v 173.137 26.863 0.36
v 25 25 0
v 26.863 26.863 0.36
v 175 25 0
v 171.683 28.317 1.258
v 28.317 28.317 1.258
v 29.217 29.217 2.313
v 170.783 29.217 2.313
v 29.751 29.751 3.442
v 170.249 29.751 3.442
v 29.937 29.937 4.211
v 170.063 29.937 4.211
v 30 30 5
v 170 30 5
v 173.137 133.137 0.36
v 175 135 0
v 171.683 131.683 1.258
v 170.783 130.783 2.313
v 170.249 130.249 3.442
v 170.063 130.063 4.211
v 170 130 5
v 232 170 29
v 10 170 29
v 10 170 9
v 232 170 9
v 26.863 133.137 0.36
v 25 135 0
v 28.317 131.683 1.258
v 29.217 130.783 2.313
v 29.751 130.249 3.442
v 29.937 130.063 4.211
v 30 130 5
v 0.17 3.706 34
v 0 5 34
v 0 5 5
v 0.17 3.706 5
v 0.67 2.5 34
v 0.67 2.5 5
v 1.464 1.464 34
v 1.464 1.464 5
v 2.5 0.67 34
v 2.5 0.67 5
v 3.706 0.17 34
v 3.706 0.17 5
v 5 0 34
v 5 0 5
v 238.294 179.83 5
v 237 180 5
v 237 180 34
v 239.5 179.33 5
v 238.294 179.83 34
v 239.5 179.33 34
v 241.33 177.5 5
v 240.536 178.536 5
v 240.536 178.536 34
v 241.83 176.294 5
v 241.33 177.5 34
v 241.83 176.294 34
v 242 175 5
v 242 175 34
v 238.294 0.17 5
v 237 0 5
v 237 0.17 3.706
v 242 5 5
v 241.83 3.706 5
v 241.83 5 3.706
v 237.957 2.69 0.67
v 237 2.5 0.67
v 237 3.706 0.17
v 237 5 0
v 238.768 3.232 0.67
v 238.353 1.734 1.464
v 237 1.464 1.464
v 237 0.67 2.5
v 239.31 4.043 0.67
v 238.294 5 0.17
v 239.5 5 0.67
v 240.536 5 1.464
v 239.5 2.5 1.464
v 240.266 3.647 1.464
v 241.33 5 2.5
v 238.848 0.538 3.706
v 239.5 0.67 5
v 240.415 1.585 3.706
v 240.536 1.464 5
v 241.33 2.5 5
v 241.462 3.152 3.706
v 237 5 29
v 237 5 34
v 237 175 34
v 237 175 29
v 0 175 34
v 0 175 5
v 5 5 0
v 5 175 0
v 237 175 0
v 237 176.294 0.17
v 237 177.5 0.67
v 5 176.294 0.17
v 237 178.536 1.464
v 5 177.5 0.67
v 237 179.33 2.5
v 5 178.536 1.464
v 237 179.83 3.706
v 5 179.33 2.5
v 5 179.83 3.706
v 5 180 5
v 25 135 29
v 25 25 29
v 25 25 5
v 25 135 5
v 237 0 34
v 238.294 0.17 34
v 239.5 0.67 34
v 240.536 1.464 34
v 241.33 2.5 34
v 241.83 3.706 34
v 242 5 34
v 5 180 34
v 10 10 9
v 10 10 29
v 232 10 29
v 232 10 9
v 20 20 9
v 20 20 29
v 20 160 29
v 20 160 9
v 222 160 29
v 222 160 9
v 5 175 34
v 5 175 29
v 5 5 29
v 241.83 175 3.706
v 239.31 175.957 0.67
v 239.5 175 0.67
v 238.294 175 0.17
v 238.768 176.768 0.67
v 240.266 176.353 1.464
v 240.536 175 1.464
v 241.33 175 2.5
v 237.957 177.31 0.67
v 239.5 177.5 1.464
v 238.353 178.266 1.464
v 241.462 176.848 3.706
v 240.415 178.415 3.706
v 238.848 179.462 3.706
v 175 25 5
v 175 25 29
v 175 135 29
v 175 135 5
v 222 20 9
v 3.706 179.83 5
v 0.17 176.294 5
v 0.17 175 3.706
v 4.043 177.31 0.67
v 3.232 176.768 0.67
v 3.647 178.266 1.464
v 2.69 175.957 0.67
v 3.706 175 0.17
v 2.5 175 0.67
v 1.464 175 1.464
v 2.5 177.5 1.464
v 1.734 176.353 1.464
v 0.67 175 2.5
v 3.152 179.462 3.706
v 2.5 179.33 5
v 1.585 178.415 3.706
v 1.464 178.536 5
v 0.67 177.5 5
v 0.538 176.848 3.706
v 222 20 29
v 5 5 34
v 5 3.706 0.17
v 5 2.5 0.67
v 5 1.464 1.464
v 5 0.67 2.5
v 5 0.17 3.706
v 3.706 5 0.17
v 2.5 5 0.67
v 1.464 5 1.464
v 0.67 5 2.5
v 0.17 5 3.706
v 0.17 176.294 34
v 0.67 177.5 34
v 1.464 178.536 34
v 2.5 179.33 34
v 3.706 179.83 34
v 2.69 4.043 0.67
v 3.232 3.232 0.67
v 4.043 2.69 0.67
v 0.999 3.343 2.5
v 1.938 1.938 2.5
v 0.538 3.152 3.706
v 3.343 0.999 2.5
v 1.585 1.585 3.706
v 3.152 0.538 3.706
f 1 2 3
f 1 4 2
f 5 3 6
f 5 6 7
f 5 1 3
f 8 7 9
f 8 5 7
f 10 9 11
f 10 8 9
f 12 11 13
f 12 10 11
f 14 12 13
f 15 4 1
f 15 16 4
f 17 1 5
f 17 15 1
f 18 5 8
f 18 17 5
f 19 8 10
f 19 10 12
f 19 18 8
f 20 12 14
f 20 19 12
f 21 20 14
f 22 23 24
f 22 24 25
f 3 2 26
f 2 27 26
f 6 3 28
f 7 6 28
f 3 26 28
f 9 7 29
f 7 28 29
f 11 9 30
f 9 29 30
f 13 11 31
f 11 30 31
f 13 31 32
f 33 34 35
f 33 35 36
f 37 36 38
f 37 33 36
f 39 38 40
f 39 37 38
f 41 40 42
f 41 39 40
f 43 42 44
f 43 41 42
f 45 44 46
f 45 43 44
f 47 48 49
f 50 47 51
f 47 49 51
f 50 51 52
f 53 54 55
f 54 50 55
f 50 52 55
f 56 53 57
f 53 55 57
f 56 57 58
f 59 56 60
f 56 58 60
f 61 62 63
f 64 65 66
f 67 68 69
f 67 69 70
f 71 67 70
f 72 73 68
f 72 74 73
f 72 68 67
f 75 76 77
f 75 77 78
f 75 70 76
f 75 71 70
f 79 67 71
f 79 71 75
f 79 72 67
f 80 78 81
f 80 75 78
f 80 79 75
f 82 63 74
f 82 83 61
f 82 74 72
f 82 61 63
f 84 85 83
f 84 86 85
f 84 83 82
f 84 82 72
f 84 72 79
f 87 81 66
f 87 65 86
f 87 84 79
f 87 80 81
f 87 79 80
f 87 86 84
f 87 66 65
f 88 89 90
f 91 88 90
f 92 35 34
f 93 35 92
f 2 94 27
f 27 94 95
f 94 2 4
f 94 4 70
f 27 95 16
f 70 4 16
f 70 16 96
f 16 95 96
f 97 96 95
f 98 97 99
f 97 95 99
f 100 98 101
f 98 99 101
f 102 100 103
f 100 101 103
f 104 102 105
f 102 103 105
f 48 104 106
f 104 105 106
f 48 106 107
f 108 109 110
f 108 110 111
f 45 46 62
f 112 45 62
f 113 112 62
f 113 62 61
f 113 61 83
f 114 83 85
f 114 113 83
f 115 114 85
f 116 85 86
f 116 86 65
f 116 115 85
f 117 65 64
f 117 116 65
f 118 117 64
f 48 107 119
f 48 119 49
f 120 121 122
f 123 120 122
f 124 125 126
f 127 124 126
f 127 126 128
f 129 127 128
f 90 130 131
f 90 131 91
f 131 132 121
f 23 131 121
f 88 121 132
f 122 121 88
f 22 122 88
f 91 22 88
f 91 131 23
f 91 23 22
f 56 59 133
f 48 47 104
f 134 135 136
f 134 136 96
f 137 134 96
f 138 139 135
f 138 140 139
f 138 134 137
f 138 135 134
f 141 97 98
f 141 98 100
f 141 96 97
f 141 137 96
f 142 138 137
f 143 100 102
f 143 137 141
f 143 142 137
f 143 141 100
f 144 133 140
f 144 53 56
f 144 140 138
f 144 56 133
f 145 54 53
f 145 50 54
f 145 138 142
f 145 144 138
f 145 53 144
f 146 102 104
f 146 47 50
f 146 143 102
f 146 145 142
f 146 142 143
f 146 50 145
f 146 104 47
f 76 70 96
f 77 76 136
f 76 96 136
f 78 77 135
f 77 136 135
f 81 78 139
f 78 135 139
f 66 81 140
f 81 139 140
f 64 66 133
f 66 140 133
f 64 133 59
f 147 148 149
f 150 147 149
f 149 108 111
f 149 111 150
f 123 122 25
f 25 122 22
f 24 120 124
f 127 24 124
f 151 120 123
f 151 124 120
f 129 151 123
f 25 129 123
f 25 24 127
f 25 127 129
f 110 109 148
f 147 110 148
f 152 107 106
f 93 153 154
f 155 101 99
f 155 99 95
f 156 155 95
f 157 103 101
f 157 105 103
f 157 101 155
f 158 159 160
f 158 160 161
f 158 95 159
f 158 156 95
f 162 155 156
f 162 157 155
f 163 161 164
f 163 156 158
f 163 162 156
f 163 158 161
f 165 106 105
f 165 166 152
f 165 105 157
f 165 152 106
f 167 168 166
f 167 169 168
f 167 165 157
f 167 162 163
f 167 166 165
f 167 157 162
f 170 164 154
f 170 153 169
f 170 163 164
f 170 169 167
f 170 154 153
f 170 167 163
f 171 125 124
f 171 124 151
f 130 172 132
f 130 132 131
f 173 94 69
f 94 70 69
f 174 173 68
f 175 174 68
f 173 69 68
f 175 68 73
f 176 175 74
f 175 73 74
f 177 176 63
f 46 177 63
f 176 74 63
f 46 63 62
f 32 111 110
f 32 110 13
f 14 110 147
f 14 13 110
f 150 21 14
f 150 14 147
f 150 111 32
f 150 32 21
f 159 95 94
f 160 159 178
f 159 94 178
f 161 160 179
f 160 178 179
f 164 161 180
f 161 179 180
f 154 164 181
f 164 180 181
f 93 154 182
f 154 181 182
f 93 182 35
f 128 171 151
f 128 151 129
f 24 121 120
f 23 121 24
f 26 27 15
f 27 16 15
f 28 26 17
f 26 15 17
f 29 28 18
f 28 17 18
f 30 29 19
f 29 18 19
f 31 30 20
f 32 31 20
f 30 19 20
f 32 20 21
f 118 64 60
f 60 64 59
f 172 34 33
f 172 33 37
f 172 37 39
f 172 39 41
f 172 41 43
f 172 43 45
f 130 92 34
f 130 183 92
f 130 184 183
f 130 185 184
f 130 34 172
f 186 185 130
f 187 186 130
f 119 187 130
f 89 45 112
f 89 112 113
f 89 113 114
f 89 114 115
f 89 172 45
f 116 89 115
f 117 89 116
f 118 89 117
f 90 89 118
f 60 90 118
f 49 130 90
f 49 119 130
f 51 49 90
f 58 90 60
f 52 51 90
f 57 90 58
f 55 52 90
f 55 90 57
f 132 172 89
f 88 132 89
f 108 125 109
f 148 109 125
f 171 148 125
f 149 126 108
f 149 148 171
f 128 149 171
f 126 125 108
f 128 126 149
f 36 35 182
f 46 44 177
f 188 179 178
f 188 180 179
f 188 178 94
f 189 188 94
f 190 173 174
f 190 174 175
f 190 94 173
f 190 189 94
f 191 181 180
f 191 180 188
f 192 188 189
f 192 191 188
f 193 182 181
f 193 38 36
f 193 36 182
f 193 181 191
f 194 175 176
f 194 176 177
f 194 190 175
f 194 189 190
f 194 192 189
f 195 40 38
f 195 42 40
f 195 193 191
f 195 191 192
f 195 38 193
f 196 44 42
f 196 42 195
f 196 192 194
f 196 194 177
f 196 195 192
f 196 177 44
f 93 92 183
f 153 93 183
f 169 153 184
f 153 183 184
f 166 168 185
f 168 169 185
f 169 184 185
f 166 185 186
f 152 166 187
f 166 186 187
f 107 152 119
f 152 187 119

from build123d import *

# Parameters (mm, degrees)
F0_W     = 242
F0_H     = 180
F1_DEPTH = 34
F2_W     = 140
F2_H     = 100
F3_DEPTH = 34.001
F4_W     = 150
F4_H     = 110
F4_W_2   = 140
F4_H_2   = 100
F5_DEPTH = 29
F6_W     = 232
F6_H     = 170
F6_W_2   = 150
F6_H_2   = 110
F7_DEPTH = 5
F8_W     = 222
F8_H     = 160
F8_W_2   = 202
F8_H_2   = 140
F9_DEPTH = 20
F10_R    = 5
F11_R    = 4.99999


# Not quite as in the source:
# - a fillet or chamfer is up to 0.001 mm smaller than in the source, because OpenCascade refuses the exact size


with BuildPart() as f1:
    # F0 (on Top) → F1 (new body)
    with BuildSketch(Plane.XY):
        with Locations((121, 90)):
            Rectangle(F0_W, F0_H)
    extrude(amount=F1_DEPTH)

    # F2 (on face) → F3 (cut, through all)
    with BuildSketch(Plane.XY.offset(34)):
        with Locations((100, 80)):
            Rectangle(F2_W, F2_H)
    extrude(amount=-F3_DEPTH, mode=Mode.SUBTRACT)

    # F4 (on face) → F5 (cut)
    with BuildSketch(Plane.XY.offset(34)):
        with Locations((100, 80)):
            Rectangle(F4_W, F4_H)
        with Locations((100, 80)):
            Rectangle(F4_W_2, F4_H_2, mode=Mode.SUBTRACT)
    extrude(amount=-F5_DEPTH, mode=Mode.SUBTRACT)

    # F6 (on face) → F7 (cut)
    with BuildSketch(Plane.XY.offset(34)):
        with Locations((121, 90)):
            Rectangle(F6_W, F6_H)
        with Locations((100, 80)):
            Rectangle(F6_W_2, F6_H_2, mode=Mode.SUBTRACT)
    extrude(amount=-F7_DEPTH, mode=Mode.SUBTRACT)

    # F8 (on face) → F9 (cut)
    with BuildSketch(Plane.XY.offset(29)):
        with Locations((121, 90)):
            Rectangle(F8_W, F8_H)
        with Locations((121, 90)):
            Rectangle(F8_W_2, F8_H_2, mode=Mode.SUBTRACT)
    extrude(amount=-F9_DEPTH, mode=Mode.SUBTRACT)

    # F10
    f10_edges = [f1.edges().sort_by_distance(p)[0] for p in [
        (242, 0, 17),
        (242, 180, 17),
        (0, 180, 17),
        (0, 0, 17),
    ]]
    fillet(f10_edges, radius=F10_R)

    # F11 (radius 5 in the source; OpenCascade refuses exactly that, so slightly less here)
    f11_edges = [f1.edges().sort_by_distance(p)[0] for p in [
        (121, 0, 0),
        (170, 80, 0),
        (100, 30, 0),
        (30, 80, 0),
        (100, 130, 0),
    ]]
    fillet(f11_edges, radius=F11_R)


solid = f1.part
